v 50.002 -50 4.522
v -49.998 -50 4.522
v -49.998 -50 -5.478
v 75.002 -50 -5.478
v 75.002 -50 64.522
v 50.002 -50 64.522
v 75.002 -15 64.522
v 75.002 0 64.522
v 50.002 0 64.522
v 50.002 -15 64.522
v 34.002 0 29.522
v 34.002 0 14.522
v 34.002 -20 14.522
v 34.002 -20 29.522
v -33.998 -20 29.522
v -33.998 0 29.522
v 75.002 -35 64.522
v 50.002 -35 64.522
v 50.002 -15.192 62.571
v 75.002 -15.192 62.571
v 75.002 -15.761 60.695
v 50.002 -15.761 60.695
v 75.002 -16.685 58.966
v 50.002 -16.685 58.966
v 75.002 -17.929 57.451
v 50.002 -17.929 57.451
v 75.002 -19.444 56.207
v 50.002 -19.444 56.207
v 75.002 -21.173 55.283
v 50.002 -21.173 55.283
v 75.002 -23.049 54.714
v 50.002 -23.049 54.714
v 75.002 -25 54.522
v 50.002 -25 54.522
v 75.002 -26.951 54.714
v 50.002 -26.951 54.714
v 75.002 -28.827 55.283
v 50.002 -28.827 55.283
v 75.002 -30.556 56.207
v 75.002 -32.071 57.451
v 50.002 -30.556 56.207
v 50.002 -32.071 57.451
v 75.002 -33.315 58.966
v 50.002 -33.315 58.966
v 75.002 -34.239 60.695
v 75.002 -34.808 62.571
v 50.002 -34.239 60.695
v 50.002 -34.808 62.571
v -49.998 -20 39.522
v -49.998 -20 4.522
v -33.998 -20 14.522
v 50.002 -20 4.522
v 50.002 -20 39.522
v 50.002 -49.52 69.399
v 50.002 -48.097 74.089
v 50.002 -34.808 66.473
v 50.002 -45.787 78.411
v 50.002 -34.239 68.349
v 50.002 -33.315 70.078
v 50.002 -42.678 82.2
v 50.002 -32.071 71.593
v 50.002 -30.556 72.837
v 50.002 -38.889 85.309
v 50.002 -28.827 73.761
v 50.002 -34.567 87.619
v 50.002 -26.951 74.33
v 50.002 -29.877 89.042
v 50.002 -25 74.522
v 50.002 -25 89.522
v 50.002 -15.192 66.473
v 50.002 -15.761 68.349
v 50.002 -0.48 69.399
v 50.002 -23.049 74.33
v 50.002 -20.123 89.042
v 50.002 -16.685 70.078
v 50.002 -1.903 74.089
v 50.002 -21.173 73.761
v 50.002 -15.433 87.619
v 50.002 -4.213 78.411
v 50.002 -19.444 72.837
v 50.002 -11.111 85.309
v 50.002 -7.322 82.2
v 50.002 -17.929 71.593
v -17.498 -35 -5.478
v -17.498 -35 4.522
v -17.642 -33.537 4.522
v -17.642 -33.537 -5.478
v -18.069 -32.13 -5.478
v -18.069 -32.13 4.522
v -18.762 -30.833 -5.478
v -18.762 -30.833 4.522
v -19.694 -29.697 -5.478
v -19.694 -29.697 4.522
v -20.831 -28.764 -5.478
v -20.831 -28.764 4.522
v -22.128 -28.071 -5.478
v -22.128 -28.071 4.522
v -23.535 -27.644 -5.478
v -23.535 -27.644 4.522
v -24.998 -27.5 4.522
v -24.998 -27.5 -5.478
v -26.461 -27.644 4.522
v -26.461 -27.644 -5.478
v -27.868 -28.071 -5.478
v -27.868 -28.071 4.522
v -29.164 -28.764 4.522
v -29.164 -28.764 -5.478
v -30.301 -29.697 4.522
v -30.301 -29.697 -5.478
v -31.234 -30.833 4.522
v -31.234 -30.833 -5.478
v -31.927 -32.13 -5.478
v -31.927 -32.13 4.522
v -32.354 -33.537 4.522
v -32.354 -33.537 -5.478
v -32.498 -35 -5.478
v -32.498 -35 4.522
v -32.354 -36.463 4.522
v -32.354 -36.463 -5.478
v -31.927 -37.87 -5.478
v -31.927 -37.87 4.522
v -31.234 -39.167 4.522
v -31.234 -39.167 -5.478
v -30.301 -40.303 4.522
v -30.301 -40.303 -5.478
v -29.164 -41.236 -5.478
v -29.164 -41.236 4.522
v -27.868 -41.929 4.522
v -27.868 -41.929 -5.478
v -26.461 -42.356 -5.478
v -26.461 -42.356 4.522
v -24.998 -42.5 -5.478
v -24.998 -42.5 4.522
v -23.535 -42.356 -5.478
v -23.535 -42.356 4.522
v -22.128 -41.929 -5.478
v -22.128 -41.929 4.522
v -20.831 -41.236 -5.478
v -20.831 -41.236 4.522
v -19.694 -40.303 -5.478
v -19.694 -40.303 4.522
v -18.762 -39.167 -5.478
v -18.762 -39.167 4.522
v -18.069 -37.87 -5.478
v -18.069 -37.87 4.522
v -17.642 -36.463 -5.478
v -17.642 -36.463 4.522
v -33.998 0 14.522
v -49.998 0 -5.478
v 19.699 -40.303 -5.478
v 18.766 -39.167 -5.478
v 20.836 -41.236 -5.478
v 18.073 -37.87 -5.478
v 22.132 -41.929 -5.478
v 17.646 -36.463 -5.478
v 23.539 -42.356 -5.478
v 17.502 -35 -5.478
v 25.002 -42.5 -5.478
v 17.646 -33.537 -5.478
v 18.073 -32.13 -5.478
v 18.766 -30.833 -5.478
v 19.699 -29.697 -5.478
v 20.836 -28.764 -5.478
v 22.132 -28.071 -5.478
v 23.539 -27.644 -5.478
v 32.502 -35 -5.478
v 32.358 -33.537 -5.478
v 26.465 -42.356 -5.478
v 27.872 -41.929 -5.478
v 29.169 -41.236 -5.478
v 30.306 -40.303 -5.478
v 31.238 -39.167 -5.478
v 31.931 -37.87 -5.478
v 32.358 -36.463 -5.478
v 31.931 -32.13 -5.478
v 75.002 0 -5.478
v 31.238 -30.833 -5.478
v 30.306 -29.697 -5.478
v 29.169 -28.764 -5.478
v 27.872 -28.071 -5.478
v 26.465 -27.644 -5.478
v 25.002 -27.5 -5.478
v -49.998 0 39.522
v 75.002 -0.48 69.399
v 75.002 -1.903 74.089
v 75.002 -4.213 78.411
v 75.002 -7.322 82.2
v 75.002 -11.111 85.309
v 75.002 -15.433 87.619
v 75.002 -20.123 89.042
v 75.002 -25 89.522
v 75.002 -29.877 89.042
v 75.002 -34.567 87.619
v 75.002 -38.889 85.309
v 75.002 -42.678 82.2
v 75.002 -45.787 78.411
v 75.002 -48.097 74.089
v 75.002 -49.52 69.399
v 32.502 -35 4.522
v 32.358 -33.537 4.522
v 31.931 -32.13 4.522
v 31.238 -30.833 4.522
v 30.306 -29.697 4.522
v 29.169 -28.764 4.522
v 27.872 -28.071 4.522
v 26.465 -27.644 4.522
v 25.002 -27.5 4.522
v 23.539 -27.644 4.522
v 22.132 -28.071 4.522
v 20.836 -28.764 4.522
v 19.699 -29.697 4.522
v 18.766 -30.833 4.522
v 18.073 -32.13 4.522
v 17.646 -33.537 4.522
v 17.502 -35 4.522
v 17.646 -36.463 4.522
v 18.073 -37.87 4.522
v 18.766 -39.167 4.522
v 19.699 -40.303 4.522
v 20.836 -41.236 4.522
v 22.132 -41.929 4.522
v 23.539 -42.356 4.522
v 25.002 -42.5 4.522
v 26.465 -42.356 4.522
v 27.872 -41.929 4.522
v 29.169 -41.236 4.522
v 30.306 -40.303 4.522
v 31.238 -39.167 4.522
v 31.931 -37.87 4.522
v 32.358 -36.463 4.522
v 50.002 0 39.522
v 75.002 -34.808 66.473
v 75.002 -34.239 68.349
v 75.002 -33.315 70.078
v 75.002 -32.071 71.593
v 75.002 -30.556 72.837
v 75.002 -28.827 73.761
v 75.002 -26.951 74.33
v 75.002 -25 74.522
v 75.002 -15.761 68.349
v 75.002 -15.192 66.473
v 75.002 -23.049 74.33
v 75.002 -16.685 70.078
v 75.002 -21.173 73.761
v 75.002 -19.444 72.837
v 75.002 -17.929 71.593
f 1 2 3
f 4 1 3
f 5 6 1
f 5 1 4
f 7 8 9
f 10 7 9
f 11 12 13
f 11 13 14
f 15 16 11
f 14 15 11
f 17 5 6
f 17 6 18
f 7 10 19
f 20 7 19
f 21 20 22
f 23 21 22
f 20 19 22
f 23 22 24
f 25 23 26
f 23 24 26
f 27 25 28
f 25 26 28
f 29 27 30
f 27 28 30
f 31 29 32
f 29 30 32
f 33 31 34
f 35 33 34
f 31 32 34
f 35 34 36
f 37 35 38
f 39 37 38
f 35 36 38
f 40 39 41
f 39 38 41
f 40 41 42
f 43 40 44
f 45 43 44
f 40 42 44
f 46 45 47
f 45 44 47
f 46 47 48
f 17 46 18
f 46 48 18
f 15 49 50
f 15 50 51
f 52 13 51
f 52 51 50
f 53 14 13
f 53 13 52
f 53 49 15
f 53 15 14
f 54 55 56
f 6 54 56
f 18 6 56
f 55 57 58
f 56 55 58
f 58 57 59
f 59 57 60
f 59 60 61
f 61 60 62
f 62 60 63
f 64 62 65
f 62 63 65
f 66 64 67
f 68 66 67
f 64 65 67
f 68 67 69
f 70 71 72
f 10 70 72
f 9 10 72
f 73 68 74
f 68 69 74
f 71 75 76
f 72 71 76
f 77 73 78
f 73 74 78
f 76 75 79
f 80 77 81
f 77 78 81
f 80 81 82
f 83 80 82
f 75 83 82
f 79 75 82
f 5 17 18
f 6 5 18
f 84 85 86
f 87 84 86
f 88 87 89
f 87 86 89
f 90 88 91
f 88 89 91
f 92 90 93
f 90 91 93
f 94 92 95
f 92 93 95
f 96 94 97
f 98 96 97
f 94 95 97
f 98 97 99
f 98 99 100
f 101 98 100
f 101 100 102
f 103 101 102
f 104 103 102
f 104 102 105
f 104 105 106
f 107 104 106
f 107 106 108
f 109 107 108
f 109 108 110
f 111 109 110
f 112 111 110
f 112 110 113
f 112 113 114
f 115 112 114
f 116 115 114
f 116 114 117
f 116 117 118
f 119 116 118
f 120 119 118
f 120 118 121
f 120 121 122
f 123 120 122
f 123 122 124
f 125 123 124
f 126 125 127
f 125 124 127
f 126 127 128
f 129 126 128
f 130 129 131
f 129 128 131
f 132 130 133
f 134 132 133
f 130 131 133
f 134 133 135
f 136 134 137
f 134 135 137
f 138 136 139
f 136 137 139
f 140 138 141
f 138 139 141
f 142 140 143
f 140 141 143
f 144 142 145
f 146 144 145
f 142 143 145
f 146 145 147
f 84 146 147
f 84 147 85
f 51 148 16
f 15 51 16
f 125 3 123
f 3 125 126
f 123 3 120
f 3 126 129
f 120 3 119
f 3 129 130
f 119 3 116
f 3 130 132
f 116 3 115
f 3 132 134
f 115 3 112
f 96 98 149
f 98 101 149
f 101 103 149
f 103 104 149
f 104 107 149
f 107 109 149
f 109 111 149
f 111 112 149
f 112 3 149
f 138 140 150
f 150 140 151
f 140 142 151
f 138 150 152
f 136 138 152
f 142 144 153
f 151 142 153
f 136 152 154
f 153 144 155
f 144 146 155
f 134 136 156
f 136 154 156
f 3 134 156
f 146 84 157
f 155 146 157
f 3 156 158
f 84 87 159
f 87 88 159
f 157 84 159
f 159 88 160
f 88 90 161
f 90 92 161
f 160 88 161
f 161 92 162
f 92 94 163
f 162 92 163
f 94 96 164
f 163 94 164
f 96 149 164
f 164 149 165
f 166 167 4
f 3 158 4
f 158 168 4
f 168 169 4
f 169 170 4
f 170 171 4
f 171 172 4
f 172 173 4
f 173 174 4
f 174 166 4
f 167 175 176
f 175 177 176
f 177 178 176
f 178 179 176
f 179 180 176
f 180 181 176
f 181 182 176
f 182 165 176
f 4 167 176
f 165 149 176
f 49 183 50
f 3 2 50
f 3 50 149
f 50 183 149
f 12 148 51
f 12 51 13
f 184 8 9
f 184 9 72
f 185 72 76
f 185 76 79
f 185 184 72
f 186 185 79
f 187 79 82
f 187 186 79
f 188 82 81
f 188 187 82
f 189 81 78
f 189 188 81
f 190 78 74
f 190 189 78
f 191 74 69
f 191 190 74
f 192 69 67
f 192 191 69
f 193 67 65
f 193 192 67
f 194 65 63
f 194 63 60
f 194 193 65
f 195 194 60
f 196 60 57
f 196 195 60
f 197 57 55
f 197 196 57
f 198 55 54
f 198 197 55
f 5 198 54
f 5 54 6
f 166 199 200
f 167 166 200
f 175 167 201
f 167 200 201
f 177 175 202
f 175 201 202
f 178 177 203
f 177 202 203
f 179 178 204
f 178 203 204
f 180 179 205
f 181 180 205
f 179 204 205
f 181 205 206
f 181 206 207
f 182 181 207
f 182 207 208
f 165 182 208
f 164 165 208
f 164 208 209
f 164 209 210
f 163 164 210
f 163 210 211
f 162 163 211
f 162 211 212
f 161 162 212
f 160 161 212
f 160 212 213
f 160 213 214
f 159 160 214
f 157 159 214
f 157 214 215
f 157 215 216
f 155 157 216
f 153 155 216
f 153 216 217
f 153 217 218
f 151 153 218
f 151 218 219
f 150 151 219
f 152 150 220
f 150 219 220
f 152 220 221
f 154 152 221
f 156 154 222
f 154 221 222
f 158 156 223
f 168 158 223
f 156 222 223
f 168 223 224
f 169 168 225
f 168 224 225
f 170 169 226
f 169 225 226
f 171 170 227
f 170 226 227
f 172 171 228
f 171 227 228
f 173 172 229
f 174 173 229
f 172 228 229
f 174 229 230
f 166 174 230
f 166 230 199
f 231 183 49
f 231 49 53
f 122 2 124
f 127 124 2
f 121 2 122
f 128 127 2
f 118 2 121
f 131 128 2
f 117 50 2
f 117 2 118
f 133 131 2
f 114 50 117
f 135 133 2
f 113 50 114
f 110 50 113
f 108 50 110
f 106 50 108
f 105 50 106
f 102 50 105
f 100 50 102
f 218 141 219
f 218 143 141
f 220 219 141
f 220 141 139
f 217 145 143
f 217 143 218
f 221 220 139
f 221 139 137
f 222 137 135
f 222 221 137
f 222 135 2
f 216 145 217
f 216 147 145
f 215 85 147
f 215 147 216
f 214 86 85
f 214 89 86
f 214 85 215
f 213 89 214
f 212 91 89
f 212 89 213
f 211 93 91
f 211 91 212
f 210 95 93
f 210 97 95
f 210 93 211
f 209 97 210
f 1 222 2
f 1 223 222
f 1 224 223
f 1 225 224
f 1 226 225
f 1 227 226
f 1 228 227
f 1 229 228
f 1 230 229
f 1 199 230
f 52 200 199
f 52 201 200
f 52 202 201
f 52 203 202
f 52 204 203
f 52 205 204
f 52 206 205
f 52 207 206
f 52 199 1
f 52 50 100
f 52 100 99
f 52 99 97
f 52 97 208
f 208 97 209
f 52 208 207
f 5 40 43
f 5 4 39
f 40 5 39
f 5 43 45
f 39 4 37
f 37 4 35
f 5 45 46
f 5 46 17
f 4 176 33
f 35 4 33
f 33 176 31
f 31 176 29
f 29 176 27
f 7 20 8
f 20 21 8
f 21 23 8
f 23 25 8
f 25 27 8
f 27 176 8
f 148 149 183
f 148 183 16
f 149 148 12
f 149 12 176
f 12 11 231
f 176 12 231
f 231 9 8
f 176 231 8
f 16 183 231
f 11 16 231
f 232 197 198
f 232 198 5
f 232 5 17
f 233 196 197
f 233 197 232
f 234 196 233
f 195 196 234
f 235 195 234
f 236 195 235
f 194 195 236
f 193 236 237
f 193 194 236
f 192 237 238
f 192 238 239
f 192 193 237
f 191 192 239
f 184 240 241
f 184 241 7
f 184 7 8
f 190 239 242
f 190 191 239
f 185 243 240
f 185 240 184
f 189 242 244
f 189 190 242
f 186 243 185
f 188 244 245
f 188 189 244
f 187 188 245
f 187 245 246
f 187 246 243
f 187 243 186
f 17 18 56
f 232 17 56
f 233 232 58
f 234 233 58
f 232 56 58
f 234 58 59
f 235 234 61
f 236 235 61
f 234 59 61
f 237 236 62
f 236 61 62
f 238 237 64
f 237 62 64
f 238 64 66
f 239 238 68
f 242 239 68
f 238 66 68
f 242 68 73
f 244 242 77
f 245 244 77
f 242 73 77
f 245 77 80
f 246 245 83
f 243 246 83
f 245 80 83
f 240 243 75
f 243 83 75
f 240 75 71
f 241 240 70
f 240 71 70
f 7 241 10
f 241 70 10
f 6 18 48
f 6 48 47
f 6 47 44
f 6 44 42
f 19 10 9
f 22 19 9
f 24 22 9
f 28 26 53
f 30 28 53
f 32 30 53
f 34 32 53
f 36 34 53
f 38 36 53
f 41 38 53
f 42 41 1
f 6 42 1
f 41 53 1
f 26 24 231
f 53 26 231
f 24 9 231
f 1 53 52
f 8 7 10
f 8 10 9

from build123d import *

# Parameters (mm, degrees)
F0_W      = 100
F0_H      = 35
F0_W_2    = 68
F0_H_2    = 15
F1_DEPTH  = 50
F2_W      = 100
F2_H      = 30
F4_DEPTH  = 35
F5_R      = 7.5
F6_DEPTH  = 2540
F8_DEPTH  = 25
F10_DEPTH = 508
F12_DEPTH = 508


with BuildPart() as f1:
    # F0 (on Front) → F1 (new body)
    with BuildSketch(Plane.XZ):
        Polygon((50.0022833438, 4.5221619845), (-49.9977166562, 4.5221619845), (-49.9977166562, -5.4778380155), (75.0022833438, -5.4778380155), (75.0022833438, 64.5221619845), (50.0022833438, 64.5221619845), (50.0022833438, 39.5221619845), align=None)
        with Locations((0.0022833438, 22.0221619845)):
            Rectangle(F0_W, F0_H)
        with Locations((0.0022833438, 22.0221619845)):
            Rectangle(F0_W_2, F0_H_2, mode=Mode.SUBTRACT)
    extrude(amount=F1_DEPTH)

    # F2 (on face) → F4 (cut)
    with BuildSketch(Plane.XY.offset(39.5221619845)):
        with Locations((0.0022833438, -35)):
            Rectangle(F2_W, F2_H)
    extrude(amount=-F4_DEPTH, mode=Mode.SUBTRACT)

    # F5 (on face) → F6 (cut)
    with BuildSketch(Plane.XY.offset(4.5221619845)):
        with Locations((-24.9977166562, -35)):
            Circle(F5_R)
        with Locations((25.0022833438, -35)):
            Circle(F5_R)
    extrude(amount=-F6_DEPTH, mode=Mode.SUBTRACT)


with BuildPart() as f8:
    # F7 (on face) → F8 (new body)
    with BuildSketch(Plane.YZ.offset(75.0022833438)):
        with BuildLine():
            Line((-50, 64.5221619845), (0, 64.5221619845))
            ThreePointArc((0, 64.5221619845), (-25, 89.5221619845), (-50, 64.5221619845))
        make_face()
    extrude(amount=-F8_DEPTH)


with BuildPart() as f10_tool:
    # F9 (on face) → F10 (new body)
    with BuildSketch(Plane(origin=(50.0022833438, 0, 0), x_dir=(0, -1, 0), z_dir=(-1, 0, 0))):
        with BuildLine():
            Line((15, 64.5221619845), (35, 64.5221619845))
            ThreePointArc((35, 64.5221619845), (25, 74.5221619845), (15, 64.5221619845))
        make_face()
        with BuildLine():
            ThreePointArc((15, 64.5221619845), (25, 54.5221619845), (35, 64.5221619845))
            Line((35, 64.5221619845), (15, 64.5221619845))
        make_face()
    extrude(amount=-F10_DEPTH)


with BuildPart() as f1_1:
    add(f1.part)

    # F10: cut by f10_tool
    add(f10_tool.part, mode=Mode.SUBTRACT)

    # F11 (on face) → F12 (cut)
    with BuildSketch(Plane(origin=(50.0022833438, 0, 0), x_dir=(0, -1, 0), z_dir=(-1, 0, 0))):
        with BuildLine():
            ThreePointArc((15, 64.5221619845), (25, 54.5221619845), (35, 64.5221619845))
            ThreePointArc((35, 64.5221619845), (25, 74.5221619845), (15, 64.5221619845))
        make_face()
    extrude(amount=-F12_DEPTH, mode=Mode.SUBTRACT)


with BuildPart() as f8_1:
    add(f8.part)

    # F10: cut by f10_tool
    add(f10_tool.part, mode=Mode.SUBTRACT)


solid = Compound([f1_1.part, f8_1.part])
